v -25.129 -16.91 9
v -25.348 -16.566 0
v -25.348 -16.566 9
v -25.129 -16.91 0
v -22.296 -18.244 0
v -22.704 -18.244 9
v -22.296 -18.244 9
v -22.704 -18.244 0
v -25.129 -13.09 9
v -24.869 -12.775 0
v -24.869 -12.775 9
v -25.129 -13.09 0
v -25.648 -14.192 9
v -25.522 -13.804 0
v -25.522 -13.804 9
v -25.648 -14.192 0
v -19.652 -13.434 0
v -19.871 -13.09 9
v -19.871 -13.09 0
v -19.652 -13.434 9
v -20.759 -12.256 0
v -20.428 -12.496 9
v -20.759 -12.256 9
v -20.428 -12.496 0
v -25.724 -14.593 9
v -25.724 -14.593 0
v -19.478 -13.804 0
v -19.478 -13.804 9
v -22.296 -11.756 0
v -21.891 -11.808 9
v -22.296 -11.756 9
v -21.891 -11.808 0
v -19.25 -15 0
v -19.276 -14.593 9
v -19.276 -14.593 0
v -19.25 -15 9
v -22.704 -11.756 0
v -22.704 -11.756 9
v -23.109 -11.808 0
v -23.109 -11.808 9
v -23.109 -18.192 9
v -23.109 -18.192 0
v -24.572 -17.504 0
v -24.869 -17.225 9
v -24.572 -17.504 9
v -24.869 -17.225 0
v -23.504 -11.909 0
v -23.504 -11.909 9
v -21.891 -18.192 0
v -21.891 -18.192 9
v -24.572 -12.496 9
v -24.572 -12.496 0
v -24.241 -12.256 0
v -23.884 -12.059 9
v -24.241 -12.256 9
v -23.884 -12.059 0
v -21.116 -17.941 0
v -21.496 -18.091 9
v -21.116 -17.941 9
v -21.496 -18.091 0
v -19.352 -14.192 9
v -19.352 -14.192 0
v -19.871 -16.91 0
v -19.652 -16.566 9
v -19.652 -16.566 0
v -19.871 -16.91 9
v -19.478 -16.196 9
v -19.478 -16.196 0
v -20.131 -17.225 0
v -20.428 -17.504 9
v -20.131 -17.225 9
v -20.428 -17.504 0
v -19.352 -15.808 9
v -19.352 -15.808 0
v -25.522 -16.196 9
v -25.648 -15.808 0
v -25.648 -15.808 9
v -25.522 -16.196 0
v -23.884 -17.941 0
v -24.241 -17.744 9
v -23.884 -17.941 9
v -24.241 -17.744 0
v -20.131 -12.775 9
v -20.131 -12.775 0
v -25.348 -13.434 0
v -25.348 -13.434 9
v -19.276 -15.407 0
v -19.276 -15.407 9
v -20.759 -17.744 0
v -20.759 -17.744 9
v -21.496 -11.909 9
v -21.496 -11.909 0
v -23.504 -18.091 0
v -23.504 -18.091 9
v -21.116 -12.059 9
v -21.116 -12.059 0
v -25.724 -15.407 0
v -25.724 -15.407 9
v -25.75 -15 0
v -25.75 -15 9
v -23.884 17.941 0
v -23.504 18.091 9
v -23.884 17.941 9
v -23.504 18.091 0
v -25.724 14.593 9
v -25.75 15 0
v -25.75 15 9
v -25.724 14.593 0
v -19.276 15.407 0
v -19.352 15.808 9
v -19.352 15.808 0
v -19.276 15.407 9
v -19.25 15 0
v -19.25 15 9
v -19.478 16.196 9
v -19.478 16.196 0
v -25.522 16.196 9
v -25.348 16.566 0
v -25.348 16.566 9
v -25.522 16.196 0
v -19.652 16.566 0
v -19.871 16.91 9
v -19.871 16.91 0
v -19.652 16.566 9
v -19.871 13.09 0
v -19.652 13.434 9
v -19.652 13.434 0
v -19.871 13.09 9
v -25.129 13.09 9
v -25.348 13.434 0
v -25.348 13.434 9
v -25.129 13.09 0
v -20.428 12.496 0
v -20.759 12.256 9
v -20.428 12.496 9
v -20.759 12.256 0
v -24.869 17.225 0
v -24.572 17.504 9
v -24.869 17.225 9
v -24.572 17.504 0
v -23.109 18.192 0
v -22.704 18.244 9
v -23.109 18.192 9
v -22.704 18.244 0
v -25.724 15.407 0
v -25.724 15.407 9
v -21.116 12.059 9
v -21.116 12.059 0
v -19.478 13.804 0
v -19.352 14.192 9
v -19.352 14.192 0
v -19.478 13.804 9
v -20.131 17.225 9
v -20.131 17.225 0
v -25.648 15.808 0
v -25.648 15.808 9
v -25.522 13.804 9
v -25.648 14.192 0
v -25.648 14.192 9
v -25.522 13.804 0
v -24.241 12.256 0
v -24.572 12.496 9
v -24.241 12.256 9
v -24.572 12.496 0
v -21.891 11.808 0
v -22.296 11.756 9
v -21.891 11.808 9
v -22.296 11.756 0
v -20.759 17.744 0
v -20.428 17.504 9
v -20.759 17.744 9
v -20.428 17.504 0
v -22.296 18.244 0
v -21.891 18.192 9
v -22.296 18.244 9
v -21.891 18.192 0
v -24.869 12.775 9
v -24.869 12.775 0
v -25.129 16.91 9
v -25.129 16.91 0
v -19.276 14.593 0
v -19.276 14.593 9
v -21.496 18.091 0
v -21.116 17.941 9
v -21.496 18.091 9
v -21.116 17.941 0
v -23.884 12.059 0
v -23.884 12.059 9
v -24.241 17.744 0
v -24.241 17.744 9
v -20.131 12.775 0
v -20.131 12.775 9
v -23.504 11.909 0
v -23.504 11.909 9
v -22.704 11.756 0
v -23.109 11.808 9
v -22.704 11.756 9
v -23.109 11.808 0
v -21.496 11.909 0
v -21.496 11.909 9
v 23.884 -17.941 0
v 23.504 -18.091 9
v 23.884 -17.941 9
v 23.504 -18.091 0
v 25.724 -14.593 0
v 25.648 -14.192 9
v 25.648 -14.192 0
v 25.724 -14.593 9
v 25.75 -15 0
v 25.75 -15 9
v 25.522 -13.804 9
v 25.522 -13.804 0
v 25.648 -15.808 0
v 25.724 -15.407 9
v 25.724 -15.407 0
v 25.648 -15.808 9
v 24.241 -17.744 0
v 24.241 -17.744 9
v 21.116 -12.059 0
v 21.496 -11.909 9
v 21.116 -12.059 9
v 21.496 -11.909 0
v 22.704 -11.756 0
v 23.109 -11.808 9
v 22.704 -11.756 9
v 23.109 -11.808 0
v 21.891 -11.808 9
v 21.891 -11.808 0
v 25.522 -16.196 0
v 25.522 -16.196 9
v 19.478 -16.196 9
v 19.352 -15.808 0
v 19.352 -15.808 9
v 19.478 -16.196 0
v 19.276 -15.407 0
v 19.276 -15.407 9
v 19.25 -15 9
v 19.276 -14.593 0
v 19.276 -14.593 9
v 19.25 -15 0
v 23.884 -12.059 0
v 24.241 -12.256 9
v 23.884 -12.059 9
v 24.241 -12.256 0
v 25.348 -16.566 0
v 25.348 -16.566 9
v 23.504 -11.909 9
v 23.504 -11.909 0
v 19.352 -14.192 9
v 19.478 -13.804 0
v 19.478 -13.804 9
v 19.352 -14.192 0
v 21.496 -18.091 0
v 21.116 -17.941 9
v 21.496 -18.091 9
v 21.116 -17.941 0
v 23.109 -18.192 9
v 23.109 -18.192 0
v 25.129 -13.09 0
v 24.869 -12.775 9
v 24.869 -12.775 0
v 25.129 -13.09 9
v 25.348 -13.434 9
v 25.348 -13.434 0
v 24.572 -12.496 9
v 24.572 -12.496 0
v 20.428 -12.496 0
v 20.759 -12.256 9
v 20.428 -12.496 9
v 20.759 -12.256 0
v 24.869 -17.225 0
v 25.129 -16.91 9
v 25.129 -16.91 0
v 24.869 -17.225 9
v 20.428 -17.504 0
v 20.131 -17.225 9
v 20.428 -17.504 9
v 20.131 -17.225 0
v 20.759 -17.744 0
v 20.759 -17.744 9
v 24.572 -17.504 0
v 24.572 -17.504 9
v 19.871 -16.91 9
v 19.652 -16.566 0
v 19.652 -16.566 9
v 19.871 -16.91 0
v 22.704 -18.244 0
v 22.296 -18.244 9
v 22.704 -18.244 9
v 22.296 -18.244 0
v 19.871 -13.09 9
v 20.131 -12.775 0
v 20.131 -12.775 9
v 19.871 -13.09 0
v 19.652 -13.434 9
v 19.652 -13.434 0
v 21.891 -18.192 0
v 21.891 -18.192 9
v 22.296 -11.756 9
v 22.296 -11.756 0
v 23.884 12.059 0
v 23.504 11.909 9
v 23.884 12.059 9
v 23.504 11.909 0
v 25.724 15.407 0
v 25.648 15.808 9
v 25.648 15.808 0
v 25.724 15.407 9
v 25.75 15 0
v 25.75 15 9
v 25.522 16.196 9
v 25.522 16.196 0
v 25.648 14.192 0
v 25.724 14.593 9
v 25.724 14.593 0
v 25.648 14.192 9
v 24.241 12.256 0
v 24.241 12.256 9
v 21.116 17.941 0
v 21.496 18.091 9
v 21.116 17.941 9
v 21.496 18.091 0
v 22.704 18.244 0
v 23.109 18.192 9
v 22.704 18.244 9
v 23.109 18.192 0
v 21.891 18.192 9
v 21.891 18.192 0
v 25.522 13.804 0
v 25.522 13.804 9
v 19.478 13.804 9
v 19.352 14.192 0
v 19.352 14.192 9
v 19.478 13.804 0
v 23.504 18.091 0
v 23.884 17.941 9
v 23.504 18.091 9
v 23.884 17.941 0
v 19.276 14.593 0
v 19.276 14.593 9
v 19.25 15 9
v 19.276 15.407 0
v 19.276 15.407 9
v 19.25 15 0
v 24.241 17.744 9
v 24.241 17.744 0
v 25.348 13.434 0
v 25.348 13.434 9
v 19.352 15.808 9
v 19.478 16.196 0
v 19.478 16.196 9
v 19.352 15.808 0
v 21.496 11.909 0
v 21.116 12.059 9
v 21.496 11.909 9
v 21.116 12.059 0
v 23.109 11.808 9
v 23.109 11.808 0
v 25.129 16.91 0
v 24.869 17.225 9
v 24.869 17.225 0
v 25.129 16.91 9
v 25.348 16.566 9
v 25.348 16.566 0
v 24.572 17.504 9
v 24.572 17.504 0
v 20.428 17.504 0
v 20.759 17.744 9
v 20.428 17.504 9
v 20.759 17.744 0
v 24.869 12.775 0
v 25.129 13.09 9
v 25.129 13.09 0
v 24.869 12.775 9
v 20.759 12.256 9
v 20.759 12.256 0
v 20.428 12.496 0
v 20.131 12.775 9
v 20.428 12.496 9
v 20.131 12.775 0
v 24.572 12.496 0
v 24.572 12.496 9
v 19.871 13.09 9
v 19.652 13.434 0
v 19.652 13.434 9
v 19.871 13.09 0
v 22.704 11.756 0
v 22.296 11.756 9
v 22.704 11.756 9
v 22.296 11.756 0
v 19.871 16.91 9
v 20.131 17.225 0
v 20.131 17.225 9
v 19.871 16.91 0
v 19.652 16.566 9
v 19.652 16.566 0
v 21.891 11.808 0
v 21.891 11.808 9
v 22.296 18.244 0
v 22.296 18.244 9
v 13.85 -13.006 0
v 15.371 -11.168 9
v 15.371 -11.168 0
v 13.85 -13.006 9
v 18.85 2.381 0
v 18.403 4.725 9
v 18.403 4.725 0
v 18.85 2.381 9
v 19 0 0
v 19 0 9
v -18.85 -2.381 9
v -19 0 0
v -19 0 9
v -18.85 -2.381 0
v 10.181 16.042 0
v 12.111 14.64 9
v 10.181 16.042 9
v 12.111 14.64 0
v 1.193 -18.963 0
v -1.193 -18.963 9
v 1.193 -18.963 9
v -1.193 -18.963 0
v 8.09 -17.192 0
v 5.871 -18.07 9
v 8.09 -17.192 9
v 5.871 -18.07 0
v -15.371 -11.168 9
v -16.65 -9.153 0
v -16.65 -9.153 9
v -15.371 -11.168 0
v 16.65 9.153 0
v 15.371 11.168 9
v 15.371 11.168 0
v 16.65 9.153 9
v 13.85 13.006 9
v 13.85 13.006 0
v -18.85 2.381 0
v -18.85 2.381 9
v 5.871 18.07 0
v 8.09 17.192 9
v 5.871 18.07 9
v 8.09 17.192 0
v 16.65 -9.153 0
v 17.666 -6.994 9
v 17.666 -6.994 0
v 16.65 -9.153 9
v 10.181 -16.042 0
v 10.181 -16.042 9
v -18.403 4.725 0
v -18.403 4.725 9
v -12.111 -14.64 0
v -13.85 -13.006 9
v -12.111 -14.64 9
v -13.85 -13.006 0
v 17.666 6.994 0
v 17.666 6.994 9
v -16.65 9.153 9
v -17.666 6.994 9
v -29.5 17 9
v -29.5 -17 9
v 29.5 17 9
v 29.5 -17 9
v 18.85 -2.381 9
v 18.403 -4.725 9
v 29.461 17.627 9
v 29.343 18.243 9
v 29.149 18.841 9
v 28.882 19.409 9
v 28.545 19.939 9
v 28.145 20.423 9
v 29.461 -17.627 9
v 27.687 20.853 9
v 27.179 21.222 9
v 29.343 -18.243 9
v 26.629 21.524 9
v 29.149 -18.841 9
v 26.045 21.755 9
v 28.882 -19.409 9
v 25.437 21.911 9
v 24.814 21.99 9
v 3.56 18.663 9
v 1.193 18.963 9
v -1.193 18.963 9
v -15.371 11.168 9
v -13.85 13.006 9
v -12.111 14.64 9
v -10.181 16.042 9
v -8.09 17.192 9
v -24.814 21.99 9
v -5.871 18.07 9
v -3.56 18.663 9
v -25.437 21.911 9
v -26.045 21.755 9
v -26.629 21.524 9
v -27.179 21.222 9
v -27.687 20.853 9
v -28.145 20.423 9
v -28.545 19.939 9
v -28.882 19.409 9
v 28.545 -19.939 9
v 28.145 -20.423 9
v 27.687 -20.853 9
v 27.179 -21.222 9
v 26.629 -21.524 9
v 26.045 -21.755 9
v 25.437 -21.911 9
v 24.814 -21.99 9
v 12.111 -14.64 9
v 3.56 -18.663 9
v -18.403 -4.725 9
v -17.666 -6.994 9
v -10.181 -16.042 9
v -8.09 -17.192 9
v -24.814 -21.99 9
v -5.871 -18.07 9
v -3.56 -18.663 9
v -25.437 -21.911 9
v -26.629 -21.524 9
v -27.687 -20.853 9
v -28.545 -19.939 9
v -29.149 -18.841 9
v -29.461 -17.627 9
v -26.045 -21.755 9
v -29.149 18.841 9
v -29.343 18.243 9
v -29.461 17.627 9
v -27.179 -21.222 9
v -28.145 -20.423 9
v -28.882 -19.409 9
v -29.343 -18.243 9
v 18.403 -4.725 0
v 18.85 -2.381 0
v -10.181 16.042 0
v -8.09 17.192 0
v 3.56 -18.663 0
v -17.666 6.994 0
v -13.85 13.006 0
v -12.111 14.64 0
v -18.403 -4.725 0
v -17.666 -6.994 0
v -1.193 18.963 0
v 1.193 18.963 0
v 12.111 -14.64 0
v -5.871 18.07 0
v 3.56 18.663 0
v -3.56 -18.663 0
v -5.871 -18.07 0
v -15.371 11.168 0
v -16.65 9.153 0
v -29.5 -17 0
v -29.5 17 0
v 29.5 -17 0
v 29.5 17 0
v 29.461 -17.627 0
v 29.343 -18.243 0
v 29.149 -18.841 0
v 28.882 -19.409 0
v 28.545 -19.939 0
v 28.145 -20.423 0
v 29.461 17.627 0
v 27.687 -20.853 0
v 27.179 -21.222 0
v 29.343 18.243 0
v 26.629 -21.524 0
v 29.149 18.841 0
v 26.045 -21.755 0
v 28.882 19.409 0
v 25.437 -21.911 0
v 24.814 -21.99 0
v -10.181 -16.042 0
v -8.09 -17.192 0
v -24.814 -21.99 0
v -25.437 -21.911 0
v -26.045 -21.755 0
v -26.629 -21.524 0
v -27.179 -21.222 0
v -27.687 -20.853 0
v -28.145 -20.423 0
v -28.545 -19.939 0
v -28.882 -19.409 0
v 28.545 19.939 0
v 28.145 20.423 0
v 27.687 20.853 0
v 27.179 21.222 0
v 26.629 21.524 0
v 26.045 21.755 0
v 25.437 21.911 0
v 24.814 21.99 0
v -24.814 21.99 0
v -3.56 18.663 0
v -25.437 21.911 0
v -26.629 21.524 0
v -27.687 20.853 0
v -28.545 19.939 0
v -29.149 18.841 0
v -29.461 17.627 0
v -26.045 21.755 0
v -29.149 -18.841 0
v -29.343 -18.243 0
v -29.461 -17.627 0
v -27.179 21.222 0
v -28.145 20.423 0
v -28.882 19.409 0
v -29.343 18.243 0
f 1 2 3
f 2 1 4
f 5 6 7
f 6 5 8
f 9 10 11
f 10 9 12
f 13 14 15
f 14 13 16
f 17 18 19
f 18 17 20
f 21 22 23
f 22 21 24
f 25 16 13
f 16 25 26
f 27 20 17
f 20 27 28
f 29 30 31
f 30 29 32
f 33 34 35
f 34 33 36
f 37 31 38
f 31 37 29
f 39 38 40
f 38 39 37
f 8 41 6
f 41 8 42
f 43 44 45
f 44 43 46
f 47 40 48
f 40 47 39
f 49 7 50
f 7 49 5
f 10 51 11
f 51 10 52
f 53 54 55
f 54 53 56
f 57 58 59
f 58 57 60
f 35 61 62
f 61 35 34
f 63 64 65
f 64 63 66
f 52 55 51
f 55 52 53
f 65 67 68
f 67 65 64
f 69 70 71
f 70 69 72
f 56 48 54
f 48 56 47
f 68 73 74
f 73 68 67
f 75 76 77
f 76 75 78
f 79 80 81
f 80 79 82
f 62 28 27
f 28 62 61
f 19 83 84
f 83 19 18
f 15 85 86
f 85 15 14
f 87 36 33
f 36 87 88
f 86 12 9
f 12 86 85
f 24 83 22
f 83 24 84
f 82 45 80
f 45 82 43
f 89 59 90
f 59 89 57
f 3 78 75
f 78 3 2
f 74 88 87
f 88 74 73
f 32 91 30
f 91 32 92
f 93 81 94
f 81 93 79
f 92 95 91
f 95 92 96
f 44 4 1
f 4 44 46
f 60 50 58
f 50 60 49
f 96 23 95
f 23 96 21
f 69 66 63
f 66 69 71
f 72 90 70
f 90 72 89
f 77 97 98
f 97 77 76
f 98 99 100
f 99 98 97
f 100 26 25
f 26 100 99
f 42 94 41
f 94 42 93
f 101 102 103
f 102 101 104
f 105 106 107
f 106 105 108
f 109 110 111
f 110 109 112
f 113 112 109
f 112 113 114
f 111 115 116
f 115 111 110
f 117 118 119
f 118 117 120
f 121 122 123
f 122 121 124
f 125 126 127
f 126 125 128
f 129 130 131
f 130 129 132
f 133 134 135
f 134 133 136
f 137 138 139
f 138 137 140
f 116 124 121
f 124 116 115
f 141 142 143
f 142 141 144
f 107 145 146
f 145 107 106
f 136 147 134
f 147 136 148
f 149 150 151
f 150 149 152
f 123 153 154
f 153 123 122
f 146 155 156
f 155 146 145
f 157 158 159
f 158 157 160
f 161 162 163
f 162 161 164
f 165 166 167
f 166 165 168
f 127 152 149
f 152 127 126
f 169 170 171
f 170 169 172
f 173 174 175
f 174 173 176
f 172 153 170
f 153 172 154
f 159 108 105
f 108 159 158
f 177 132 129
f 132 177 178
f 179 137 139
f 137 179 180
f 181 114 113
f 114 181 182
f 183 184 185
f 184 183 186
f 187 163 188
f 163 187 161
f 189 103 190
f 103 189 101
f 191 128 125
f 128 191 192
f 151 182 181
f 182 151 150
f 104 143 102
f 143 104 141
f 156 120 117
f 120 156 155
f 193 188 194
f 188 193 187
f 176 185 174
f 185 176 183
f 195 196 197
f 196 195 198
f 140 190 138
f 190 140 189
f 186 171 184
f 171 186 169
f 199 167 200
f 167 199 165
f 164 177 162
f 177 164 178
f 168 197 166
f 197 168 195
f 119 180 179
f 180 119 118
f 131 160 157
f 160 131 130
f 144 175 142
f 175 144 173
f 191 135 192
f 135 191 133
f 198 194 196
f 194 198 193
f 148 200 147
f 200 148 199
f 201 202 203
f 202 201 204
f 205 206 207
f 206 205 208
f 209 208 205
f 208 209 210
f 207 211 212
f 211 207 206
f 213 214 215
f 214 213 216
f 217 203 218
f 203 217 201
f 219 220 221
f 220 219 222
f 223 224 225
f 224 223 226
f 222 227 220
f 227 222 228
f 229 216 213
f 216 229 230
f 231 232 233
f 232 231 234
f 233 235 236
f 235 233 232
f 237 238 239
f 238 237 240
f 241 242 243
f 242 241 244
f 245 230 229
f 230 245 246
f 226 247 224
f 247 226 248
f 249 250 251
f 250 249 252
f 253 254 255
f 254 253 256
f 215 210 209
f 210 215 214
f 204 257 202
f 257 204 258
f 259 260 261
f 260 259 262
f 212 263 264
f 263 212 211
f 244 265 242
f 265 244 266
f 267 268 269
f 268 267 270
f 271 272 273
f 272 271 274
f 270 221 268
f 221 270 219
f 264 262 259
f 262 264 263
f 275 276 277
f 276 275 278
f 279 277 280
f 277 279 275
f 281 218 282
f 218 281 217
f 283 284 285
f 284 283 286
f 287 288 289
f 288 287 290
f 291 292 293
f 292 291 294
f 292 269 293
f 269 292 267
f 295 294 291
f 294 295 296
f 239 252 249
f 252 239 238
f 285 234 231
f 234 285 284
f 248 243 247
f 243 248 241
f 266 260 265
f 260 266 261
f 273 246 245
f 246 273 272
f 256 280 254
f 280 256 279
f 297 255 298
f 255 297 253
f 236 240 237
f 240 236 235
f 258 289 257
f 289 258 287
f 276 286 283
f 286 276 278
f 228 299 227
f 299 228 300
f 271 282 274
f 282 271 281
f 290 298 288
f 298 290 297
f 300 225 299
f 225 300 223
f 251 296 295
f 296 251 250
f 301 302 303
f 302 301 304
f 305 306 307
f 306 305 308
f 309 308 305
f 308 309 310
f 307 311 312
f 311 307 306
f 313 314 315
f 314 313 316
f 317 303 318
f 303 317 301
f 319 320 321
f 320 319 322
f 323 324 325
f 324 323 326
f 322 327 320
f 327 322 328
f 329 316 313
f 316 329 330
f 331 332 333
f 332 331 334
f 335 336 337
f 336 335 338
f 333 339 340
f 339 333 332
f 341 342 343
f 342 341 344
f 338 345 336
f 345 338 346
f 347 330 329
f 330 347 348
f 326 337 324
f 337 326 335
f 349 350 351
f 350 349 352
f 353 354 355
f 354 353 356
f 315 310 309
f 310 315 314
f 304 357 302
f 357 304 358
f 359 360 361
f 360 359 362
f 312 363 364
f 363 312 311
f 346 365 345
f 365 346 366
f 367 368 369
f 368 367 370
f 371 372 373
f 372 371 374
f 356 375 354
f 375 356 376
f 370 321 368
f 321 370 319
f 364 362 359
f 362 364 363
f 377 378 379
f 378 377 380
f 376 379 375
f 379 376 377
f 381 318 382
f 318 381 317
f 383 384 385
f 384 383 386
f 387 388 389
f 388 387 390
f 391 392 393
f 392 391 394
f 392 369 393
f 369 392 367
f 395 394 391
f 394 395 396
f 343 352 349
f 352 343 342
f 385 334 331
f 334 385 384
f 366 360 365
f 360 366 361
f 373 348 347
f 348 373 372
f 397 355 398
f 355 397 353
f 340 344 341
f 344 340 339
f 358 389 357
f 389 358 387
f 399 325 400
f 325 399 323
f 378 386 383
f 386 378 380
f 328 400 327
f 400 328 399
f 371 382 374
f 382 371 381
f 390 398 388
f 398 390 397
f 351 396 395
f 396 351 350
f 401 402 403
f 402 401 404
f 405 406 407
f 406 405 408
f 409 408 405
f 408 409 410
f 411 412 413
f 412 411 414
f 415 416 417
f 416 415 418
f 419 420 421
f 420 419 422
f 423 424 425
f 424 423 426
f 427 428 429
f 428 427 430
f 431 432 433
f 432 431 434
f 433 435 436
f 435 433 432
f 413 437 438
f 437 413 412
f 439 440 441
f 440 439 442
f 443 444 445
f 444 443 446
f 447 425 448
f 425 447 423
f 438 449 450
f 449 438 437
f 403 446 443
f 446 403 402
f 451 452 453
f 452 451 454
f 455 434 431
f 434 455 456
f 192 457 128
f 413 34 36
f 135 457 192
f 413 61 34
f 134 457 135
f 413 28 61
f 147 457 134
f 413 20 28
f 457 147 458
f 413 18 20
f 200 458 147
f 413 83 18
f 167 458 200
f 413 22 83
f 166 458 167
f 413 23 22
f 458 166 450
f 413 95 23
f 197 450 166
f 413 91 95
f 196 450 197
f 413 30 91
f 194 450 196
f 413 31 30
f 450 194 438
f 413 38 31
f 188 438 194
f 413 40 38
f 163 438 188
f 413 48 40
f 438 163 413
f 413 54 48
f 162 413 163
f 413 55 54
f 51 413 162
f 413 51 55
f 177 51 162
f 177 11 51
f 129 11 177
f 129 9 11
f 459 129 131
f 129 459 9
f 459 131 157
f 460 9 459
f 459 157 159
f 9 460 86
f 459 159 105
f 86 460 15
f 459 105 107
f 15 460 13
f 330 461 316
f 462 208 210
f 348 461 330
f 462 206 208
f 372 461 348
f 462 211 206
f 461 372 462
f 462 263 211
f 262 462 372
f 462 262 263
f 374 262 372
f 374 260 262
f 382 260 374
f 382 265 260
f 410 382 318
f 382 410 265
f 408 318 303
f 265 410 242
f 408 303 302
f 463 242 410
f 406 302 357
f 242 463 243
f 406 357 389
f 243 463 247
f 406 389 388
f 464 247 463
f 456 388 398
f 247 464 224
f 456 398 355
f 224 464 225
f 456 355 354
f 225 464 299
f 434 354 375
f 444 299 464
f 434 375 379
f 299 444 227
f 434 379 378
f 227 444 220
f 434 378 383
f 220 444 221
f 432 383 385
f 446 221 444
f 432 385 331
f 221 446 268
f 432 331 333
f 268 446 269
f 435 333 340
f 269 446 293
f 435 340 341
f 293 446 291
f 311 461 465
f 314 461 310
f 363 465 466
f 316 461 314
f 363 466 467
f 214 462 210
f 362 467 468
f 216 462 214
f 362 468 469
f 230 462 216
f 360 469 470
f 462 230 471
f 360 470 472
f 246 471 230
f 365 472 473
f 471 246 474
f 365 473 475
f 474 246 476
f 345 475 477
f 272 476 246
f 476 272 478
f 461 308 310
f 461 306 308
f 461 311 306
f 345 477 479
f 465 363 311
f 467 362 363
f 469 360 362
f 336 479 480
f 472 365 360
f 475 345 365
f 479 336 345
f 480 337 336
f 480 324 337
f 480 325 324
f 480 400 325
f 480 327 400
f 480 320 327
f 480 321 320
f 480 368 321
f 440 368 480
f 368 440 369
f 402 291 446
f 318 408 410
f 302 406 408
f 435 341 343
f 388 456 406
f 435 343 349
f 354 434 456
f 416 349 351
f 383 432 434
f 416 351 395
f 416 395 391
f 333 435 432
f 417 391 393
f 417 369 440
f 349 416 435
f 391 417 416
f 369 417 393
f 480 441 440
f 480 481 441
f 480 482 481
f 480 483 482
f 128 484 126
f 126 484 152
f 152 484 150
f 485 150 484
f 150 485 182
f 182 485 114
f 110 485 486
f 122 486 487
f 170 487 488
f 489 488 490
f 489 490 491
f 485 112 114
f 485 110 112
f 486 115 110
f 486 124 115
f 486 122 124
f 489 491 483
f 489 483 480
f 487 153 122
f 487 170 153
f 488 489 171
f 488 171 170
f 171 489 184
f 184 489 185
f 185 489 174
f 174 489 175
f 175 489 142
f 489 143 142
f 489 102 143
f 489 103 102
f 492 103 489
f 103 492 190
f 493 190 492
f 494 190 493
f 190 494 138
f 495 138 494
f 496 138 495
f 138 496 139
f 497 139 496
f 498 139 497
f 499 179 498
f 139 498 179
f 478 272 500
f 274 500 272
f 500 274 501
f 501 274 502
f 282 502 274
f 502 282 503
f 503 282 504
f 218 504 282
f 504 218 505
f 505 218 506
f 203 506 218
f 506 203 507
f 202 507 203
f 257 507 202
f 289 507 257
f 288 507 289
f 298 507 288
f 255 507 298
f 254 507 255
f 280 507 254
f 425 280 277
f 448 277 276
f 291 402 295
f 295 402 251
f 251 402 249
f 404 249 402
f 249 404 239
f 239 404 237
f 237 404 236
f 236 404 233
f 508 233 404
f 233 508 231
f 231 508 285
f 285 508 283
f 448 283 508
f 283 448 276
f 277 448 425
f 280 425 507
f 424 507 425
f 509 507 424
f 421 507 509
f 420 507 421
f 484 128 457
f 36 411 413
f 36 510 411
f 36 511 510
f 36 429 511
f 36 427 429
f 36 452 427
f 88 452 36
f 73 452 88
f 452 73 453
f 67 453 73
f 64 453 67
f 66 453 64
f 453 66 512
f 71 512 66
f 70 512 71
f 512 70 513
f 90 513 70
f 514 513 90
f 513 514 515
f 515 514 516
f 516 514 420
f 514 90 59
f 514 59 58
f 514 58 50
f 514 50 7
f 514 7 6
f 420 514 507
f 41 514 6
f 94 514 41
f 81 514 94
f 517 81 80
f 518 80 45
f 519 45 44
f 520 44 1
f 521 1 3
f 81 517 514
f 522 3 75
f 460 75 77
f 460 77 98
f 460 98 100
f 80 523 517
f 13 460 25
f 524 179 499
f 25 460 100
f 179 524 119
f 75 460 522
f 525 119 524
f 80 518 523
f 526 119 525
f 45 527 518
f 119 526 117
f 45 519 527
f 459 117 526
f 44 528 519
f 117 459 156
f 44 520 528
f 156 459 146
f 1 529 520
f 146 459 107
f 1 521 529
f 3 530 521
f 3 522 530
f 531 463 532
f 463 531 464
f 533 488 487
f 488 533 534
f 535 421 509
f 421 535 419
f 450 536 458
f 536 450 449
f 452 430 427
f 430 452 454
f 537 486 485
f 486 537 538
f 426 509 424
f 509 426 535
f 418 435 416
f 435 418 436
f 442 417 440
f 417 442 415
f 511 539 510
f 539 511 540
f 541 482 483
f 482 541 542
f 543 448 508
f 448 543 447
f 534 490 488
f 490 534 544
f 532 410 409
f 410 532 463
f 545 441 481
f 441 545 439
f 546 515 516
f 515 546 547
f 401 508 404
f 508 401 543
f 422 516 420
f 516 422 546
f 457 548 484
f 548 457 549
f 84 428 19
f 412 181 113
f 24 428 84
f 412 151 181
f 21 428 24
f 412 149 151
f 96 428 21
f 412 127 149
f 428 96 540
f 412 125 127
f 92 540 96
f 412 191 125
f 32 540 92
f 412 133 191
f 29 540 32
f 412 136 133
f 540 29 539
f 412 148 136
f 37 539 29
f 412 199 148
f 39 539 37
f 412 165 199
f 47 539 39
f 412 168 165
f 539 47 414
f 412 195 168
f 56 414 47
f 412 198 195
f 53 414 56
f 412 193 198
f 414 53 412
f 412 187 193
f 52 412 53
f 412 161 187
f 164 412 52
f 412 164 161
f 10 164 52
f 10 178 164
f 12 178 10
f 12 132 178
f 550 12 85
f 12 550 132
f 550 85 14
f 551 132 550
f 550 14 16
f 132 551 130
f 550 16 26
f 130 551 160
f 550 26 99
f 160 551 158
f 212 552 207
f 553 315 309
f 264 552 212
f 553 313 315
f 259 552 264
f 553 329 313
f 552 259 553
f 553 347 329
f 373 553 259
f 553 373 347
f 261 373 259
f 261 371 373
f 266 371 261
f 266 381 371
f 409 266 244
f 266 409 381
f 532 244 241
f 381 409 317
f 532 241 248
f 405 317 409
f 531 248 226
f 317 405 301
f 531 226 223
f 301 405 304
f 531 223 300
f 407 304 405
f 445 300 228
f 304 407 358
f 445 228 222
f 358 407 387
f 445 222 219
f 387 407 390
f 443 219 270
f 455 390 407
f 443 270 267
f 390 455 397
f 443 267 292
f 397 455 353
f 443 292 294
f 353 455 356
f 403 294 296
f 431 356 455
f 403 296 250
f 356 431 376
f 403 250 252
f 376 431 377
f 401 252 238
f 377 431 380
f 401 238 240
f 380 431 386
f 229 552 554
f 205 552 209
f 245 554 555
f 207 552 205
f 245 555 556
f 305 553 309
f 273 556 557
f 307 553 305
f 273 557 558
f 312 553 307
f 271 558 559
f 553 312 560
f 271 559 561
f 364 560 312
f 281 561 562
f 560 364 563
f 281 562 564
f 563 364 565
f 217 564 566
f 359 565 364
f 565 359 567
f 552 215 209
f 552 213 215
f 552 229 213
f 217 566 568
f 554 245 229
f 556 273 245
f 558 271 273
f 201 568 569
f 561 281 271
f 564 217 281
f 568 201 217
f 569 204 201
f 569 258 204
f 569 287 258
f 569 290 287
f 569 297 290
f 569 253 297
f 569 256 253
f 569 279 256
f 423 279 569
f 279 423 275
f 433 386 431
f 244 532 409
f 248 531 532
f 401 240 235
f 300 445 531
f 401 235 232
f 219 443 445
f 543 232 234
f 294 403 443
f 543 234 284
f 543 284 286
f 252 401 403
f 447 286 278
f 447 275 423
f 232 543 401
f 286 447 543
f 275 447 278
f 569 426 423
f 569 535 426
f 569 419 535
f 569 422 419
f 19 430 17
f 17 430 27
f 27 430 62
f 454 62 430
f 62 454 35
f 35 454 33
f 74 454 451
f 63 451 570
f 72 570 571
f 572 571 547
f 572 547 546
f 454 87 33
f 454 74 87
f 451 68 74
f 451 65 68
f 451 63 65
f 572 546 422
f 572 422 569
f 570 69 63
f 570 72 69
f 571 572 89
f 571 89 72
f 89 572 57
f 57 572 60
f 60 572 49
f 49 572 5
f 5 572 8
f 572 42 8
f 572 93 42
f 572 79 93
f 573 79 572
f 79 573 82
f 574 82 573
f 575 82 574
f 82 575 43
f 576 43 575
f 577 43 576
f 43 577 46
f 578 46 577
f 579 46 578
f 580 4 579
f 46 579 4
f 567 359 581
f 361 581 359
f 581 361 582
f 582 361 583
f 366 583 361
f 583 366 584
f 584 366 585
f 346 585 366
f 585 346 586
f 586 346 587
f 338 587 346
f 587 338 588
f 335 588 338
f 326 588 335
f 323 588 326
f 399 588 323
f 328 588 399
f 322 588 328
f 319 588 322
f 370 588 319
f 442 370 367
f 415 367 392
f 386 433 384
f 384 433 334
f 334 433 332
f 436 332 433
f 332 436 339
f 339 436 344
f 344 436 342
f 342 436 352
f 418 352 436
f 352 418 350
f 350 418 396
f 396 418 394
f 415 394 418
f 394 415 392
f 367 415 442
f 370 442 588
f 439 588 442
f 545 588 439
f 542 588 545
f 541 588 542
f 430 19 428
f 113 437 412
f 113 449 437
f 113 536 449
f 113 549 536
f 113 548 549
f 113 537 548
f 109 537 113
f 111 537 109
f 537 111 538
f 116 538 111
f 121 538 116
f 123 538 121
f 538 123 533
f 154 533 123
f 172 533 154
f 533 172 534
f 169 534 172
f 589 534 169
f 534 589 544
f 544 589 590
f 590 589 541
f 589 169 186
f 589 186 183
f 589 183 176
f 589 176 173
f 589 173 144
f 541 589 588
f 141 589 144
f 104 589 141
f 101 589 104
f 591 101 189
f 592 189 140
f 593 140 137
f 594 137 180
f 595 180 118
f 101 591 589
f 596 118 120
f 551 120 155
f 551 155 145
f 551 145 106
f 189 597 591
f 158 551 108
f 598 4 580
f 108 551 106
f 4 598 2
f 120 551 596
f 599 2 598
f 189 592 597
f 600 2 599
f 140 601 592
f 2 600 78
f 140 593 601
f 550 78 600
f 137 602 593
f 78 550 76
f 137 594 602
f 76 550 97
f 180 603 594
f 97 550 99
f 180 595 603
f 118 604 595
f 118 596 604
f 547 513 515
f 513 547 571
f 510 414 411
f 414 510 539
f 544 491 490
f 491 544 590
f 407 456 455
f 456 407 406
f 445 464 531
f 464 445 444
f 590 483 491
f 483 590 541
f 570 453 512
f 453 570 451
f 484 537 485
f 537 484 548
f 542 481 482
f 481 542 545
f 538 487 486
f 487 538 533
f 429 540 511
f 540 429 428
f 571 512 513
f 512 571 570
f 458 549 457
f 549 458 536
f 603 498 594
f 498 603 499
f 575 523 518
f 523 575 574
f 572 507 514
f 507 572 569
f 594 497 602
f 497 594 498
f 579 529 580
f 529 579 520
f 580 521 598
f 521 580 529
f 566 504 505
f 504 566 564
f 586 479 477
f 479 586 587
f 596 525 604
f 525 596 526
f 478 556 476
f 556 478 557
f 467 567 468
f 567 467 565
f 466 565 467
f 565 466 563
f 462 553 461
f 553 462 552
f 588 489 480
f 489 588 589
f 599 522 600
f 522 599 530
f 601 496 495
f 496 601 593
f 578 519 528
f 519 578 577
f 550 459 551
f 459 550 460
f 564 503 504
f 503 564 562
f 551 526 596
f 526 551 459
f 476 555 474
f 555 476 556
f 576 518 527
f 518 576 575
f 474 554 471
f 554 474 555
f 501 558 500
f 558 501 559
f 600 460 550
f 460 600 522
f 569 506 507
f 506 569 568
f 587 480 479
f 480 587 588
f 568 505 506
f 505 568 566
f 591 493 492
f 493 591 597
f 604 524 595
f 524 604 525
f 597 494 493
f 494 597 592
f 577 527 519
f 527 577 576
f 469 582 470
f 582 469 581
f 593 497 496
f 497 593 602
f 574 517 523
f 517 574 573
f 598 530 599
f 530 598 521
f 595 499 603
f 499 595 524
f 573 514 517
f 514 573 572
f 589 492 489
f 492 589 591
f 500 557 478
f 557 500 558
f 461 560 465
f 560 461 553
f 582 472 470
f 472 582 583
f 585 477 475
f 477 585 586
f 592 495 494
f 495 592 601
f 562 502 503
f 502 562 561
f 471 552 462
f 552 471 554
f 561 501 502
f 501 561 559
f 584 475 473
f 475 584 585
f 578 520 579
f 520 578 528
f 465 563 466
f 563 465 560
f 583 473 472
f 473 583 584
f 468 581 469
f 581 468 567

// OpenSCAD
$fn = 50;


difference() {
	union() {
		hull() {
			translate(v = [-24.5000000000, 17.0000000000, 0]) {
				cylinder(h = 9, r = 5);
			}
			translate(v = [24.5000000000, 17.0000000000, 0]) {
				cylinder(h = 9, r = 5);
			}
			translate(v = [-24.5000000000, -17.0000000000, 0]) {
				cylinder(h = 9, r = 5);
			}
			translate(v = [24.5000000000, -17.0000000000, 0]) {
				cylinder(h = 9, r = 5);
			}
		}
	}
	union() {
		#translate(v = [-22.5000000000, -15.0000000000, -100.0000000000]) {
			cylinder(h = 200, r = 3.2500000000);
		}
		#translate(v = [-22.5000000000, 15.0000000000, -100.0000000000]) {
			cylinder(h = 200, r = 3.2500000000);
		}
		#translate(v = [22.5000000000, -15.0000000000, -100.0000000000]) {
			cylinder(h = 200, r = 3.2500000000);
		}
		#translate(v = [22.5000000000, 15.0000000000, -100.0000000000]) {
			cylinder(h = 200, r = 3.2500000000);
		}
		#cylinder(h = 9, r = 19.0000000000);
	}
}
